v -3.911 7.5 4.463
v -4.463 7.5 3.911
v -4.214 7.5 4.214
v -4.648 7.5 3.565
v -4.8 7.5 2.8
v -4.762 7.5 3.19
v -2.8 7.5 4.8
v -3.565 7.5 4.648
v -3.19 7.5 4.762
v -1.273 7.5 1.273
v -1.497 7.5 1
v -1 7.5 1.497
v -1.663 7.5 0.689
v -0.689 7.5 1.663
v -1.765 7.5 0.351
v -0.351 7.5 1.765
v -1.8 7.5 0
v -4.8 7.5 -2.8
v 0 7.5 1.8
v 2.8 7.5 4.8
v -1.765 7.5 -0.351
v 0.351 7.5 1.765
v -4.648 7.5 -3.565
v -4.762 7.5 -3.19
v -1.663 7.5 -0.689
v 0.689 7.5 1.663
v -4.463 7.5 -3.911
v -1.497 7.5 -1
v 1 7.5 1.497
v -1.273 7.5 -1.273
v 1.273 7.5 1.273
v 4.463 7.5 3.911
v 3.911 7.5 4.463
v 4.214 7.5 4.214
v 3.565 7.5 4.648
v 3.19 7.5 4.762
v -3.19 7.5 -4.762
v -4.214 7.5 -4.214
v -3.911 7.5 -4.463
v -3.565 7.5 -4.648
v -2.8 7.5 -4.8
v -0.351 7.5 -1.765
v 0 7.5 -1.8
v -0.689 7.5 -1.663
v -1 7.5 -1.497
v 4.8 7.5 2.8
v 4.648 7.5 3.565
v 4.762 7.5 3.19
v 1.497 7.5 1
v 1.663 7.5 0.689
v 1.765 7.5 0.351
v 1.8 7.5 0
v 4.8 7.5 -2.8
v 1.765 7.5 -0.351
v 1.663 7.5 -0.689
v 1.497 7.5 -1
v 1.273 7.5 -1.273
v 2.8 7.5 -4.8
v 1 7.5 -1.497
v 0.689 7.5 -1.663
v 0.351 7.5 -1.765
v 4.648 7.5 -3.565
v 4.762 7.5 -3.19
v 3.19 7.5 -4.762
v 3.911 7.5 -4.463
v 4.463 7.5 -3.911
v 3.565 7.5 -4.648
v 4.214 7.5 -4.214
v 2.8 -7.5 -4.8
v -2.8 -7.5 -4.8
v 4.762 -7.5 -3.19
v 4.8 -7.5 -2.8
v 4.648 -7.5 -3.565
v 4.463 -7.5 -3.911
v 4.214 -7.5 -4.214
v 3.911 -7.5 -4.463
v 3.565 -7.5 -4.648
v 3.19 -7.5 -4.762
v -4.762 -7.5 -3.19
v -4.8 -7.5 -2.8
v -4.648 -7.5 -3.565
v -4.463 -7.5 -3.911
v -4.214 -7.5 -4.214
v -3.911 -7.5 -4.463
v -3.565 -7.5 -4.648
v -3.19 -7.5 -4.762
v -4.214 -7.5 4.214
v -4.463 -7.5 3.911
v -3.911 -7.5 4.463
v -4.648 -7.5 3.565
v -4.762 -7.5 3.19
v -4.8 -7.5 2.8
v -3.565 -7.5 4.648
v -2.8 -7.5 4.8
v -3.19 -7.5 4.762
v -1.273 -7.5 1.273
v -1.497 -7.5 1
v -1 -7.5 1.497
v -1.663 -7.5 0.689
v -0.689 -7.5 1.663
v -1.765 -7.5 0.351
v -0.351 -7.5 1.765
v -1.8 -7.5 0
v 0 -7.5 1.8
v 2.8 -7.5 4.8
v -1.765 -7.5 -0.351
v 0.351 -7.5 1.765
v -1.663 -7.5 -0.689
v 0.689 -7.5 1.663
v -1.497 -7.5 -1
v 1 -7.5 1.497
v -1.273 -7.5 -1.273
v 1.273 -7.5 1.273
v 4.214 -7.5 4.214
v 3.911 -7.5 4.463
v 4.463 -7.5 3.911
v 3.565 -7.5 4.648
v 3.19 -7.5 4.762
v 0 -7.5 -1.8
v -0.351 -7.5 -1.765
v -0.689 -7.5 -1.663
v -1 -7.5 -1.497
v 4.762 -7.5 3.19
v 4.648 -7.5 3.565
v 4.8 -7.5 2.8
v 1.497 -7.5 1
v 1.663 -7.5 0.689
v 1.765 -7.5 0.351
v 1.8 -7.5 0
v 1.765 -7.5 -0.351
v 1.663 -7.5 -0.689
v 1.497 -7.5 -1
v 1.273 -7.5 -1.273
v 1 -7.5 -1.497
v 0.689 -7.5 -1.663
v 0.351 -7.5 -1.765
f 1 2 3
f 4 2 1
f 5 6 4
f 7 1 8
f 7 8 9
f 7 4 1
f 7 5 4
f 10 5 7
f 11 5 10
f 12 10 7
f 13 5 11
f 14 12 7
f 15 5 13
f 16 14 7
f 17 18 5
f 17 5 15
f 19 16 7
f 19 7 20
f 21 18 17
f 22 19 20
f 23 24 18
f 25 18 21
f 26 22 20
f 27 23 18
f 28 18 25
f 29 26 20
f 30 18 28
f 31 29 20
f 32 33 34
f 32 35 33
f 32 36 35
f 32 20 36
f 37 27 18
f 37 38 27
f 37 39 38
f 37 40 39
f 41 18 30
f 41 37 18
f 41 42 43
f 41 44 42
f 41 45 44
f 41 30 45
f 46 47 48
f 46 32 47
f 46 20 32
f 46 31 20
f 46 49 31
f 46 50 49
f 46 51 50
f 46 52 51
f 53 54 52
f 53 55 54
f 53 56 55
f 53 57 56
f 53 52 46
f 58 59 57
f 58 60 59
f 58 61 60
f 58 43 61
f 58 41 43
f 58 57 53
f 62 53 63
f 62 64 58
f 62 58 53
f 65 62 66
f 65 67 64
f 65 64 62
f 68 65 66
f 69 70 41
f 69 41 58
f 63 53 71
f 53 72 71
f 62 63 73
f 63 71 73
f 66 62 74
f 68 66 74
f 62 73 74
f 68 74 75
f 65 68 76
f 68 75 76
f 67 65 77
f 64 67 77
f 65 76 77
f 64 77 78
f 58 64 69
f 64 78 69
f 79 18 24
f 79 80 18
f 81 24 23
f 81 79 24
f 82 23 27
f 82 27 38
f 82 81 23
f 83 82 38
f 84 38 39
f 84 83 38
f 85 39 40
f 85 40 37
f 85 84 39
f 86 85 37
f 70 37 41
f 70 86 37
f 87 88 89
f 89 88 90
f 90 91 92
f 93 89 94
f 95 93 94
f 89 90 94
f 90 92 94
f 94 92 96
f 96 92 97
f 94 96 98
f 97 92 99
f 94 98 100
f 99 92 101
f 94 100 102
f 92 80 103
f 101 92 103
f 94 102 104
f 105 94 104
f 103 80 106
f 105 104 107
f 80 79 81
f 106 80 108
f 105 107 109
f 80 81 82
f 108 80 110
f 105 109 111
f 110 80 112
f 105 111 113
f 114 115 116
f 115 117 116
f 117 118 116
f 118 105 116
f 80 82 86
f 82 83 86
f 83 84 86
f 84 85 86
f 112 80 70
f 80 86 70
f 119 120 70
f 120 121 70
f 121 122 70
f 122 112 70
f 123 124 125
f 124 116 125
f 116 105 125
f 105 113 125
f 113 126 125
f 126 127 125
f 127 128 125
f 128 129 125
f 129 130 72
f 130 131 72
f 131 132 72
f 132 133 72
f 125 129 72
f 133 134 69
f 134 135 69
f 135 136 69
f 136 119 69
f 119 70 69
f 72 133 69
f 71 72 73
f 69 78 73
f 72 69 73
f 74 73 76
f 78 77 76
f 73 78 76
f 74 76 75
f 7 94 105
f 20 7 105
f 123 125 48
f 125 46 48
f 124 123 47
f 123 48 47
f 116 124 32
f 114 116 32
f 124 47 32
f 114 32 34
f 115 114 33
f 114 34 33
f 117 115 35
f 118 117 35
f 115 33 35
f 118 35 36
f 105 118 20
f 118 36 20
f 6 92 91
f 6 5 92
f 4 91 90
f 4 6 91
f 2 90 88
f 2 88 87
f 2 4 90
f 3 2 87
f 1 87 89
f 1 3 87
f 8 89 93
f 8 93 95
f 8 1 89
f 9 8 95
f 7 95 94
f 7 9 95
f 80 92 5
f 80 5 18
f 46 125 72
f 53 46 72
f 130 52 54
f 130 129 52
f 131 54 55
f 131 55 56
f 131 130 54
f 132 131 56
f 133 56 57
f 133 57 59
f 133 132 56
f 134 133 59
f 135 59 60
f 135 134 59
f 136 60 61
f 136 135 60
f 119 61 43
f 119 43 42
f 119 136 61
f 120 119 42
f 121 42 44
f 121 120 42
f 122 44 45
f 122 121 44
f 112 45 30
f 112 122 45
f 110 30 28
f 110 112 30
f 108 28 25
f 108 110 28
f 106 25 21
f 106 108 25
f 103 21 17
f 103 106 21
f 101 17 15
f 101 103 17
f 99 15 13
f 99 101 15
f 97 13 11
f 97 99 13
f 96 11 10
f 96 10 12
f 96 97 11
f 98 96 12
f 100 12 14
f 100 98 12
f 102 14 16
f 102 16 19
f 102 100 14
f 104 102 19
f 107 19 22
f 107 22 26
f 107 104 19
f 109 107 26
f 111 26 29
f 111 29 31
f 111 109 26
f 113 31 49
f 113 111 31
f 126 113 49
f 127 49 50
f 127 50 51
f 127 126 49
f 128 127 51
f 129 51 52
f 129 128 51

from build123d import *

# Parameters (mm, degrees)
SKETCH1_W           = 9.6
SKETCH1_H           = 9.6
SKETCH1_R           = 1.8
BOSS_EXTRUDE1_DEPTH = 7.5
FILLET1_R           = 2


with BuildPart() as part:
    # Sketch1 → Boss-Extrude1 (new body, symmetric)
    with BuildSketch(Plane(origin=(0, 0, 0), x_dir=(1, 0, 0), z_dir=(0, 1, 0))):
        Rectangle(SKETCH1_W, SKETCH1_H)
        Circle(SKETCH1_R, mode=Mode.SUBTRACT)
    extrude(amount=BOSS_EXTRUDE1_DEPTH, both=True)

    # Fillet1
    fillet1_edges = [part.edges().sort_by_distance(p)[0] for p in [
        (-4.8, 0, -4.8),
        (4.8, 0, -4.8),
        (4.8, 0, 4.8),
        (-4.8, 0, 4.8),
    ]]
    fillet(fillet1_edges, radius=FILLET1_R)


solid = part.part
